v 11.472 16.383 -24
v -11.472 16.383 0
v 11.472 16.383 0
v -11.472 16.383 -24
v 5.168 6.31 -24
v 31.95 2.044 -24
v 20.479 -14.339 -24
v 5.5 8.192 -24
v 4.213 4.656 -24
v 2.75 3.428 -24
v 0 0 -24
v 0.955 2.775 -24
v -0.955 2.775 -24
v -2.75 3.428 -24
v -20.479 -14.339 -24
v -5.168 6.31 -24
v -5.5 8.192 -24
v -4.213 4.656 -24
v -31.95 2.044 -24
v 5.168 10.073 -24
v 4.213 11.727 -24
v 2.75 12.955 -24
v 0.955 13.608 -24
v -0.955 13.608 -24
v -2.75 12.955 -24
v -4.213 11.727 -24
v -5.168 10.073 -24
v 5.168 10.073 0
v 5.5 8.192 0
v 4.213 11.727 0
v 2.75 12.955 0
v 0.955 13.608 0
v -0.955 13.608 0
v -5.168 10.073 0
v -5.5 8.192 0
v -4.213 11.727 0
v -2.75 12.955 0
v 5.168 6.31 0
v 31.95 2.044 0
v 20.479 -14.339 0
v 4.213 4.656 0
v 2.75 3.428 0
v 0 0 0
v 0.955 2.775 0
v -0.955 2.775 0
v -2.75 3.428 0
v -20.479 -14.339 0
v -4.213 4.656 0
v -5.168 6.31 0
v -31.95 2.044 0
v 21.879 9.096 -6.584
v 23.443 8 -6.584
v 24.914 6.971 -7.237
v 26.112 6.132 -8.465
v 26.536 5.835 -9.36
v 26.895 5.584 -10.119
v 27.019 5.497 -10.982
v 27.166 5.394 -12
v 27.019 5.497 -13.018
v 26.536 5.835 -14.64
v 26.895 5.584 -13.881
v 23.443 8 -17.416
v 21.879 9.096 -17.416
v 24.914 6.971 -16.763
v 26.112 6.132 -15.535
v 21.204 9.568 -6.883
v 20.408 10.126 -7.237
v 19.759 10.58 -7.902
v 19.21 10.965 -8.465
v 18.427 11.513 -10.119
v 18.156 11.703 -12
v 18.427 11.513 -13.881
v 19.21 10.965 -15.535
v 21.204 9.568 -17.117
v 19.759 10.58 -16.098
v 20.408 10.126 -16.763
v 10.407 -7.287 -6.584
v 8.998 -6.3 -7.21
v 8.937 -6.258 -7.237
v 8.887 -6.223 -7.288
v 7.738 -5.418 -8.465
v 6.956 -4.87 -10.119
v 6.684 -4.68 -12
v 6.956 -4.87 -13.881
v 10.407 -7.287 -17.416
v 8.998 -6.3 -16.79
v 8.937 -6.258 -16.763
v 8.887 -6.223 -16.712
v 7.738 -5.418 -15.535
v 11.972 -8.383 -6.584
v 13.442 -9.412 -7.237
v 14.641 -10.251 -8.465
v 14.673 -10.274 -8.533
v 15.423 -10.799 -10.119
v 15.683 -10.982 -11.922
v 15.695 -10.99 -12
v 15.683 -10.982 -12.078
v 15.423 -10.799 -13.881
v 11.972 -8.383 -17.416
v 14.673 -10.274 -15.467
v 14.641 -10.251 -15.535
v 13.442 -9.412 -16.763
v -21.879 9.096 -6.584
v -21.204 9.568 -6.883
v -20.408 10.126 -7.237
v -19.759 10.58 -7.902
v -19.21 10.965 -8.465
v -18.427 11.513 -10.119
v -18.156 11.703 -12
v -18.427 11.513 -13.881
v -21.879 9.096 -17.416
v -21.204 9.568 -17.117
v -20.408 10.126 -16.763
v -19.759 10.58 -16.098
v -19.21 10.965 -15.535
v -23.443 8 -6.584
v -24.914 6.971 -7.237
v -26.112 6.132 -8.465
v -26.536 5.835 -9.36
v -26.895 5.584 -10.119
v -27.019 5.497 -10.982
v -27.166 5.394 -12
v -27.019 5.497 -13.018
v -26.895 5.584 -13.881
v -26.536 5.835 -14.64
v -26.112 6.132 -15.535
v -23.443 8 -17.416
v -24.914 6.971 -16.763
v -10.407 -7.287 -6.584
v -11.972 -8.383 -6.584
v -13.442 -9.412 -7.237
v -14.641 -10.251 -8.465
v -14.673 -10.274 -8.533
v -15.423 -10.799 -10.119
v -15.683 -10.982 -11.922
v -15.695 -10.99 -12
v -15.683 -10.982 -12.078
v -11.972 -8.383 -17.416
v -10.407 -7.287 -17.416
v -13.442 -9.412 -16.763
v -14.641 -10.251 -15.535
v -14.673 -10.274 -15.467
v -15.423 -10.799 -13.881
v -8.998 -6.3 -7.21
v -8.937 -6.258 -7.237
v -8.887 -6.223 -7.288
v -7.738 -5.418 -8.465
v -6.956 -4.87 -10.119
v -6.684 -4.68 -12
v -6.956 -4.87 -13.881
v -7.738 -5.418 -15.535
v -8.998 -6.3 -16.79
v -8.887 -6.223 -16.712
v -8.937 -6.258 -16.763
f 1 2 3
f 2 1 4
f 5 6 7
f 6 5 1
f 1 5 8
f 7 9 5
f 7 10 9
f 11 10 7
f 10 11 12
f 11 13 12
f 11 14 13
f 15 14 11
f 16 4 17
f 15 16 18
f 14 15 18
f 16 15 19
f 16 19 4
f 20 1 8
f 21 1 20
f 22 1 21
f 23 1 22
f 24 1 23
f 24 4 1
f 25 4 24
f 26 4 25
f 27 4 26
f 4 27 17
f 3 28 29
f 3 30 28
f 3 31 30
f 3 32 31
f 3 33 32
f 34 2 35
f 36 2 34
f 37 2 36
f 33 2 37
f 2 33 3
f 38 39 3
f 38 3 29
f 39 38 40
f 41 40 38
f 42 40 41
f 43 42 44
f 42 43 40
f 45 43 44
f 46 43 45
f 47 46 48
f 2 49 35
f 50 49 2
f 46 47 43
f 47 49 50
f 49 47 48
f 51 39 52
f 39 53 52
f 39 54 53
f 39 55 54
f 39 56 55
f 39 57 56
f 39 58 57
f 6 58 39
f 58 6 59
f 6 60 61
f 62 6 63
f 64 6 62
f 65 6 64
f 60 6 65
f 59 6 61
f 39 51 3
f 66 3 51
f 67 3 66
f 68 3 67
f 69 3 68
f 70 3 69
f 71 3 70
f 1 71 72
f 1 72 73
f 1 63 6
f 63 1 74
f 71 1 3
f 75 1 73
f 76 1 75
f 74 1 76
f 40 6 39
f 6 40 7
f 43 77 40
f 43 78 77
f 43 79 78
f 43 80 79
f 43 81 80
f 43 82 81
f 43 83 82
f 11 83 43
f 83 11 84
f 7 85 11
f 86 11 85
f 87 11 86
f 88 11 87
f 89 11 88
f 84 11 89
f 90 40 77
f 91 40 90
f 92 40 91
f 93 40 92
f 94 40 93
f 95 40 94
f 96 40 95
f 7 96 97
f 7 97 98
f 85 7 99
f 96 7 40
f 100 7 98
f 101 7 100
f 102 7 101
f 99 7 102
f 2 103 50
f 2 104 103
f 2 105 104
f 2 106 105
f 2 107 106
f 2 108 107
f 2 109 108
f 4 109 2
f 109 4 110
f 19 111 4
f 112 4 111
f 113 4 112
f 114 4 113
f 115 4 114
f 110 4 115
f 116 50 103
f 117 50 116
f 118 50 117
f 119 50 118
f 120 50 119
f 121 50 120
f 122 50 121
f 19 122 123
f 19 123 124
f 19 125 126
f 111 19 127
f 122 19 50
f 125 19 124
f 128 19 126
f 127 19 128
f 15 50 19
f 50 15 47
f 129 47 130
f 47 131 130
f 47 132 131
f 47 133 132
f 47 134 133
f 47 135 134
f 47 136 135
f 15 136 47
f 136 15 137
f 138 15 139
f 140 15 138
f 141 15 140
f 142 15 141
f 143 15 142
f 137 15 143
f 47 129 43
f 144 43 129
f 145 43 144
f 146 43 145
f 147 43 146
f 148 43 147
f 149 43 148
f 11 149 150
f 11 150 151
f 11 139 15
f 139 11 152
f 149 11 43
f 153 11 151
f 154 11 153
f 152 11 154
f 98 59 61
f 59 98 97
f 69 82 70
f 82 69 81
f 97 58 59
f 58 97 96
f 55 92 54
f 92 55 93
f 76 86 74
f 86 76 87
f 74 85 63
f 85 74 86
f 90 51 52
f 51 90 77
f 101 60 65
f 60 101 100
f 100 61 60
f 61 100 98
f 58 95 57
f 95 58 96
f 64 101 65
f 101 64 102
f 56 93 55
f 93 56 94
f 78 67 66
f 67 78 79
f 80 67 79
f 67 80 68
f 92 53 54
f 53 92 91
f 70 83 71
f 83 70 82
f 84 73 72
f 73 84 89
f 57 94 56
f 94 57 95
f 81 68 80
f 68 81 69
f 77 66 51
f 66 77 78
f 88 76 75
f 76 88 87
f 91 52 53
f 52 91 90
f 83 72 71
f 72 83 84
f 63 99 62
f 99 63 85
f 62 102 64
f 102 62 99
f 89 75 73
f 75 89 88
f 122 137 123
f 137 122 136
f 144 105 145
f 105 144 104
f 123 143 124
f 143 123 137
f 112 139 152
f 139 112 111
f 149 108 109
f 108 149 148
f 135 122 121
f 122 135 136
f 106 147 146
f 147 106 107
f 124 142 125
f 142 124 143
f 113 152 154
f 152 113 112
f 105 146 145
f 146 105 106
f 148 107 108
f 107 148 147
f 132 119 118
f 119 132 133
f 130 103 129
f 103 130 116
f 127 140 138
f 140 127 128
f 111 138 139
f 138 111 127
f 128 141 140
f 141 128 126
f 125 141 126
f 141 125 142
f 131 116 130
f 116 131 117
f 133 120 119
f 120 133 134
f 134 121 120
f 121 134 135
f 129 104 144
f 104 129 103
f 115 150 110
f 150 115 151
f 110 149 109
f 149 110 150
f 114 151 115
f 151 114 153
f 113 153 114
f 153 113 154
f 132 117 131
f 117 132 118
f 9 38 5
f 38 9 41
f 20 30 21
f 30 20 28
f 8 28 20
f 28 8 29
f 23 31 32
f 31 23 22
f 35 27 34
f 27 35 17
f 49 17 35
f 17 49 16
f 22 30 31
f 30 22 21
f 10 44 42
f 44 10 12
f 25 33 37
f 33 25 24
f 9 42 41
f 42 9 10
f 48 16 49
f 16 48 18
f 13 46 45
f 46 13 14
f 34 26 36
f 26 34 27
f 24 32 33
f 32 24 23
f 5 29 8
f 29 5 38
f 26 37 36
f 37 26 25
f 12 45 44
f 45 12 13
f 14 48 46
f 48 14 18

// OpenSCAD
//width
w = 50;

//height
h = 20;

//length
l = 24;

//angle
a =35;

//radius
r = 5.5;

//nut radius
nr = 10.5;

//nut height
nh = 7;





rotate([-90,0,0])
difference()
{
//rotate([90,0,0])
/*
linear_extrude(height=l)
polygon(points=[[0,0],[0,h],[(w/2),h+(w/2)*tan(a)],[w,h],[w,0],[w/2,(w/2)*tan(a)]]);
*/
union()
{
translate([-h*sin(a),0,0])
cube([h*sin(a)*2,l,h*cos(a)]);


rotate([0,a,0])
cube([w/2,l,h]);

rotate([0,-a,0])
translate([-w/2,0,0])
cube([w/2,l,h]);
}



union()
{
translate([(w/4)*cos(a),l/2,-(h/2)*cos(a)-1])
hole();

translate([-(w/4)*cos(a),l/2,-(h/2)*cos(a)-1])
mirror([1,0,0])
hole();
}


rotate([90,0,0])
translate([0,h*cos(a)/2,-h*2-1])
cylinder(r=r, h=h*3);


}

module hole()
{
//translate([0,0,10])
rotate([0,a,0])
union()
{
//translate([(4*w/5),-l/2,-0])
//rotate([0,a,0])
cylinder(r=r, h=40);


//translate([(4*w/5),-l/2,-nh])
//rotate([0,a,0])

//hex hole
//cylinder(r=nr, h=nh*2,$fn=6);
}
}



/*

mirror([1,0,0])
translate([-(1*w/3),l/2,-4])
rotate([0,a,0])
cylinder(r=r, h=40);



difference()
{
union()
{
cube([w,l,h]);
}

union()
{
translate([w/2,0,h])
rotate([0,a,0])
cube([w,l,h]);

mirror([1,0,0])
translate([-w/2,0,h])
rotate([0,a,0])
cube([w,l,h]);




translate([(2*w/3),l/2,-nh])
rotate([0,a,0])
cylinder(r=nr, h=nh*2);

}
}


rotate([0,180,0])
translate([w/2,0,-h/2])
rotate([0,a,0])
cube([w,l,h]);
*/
